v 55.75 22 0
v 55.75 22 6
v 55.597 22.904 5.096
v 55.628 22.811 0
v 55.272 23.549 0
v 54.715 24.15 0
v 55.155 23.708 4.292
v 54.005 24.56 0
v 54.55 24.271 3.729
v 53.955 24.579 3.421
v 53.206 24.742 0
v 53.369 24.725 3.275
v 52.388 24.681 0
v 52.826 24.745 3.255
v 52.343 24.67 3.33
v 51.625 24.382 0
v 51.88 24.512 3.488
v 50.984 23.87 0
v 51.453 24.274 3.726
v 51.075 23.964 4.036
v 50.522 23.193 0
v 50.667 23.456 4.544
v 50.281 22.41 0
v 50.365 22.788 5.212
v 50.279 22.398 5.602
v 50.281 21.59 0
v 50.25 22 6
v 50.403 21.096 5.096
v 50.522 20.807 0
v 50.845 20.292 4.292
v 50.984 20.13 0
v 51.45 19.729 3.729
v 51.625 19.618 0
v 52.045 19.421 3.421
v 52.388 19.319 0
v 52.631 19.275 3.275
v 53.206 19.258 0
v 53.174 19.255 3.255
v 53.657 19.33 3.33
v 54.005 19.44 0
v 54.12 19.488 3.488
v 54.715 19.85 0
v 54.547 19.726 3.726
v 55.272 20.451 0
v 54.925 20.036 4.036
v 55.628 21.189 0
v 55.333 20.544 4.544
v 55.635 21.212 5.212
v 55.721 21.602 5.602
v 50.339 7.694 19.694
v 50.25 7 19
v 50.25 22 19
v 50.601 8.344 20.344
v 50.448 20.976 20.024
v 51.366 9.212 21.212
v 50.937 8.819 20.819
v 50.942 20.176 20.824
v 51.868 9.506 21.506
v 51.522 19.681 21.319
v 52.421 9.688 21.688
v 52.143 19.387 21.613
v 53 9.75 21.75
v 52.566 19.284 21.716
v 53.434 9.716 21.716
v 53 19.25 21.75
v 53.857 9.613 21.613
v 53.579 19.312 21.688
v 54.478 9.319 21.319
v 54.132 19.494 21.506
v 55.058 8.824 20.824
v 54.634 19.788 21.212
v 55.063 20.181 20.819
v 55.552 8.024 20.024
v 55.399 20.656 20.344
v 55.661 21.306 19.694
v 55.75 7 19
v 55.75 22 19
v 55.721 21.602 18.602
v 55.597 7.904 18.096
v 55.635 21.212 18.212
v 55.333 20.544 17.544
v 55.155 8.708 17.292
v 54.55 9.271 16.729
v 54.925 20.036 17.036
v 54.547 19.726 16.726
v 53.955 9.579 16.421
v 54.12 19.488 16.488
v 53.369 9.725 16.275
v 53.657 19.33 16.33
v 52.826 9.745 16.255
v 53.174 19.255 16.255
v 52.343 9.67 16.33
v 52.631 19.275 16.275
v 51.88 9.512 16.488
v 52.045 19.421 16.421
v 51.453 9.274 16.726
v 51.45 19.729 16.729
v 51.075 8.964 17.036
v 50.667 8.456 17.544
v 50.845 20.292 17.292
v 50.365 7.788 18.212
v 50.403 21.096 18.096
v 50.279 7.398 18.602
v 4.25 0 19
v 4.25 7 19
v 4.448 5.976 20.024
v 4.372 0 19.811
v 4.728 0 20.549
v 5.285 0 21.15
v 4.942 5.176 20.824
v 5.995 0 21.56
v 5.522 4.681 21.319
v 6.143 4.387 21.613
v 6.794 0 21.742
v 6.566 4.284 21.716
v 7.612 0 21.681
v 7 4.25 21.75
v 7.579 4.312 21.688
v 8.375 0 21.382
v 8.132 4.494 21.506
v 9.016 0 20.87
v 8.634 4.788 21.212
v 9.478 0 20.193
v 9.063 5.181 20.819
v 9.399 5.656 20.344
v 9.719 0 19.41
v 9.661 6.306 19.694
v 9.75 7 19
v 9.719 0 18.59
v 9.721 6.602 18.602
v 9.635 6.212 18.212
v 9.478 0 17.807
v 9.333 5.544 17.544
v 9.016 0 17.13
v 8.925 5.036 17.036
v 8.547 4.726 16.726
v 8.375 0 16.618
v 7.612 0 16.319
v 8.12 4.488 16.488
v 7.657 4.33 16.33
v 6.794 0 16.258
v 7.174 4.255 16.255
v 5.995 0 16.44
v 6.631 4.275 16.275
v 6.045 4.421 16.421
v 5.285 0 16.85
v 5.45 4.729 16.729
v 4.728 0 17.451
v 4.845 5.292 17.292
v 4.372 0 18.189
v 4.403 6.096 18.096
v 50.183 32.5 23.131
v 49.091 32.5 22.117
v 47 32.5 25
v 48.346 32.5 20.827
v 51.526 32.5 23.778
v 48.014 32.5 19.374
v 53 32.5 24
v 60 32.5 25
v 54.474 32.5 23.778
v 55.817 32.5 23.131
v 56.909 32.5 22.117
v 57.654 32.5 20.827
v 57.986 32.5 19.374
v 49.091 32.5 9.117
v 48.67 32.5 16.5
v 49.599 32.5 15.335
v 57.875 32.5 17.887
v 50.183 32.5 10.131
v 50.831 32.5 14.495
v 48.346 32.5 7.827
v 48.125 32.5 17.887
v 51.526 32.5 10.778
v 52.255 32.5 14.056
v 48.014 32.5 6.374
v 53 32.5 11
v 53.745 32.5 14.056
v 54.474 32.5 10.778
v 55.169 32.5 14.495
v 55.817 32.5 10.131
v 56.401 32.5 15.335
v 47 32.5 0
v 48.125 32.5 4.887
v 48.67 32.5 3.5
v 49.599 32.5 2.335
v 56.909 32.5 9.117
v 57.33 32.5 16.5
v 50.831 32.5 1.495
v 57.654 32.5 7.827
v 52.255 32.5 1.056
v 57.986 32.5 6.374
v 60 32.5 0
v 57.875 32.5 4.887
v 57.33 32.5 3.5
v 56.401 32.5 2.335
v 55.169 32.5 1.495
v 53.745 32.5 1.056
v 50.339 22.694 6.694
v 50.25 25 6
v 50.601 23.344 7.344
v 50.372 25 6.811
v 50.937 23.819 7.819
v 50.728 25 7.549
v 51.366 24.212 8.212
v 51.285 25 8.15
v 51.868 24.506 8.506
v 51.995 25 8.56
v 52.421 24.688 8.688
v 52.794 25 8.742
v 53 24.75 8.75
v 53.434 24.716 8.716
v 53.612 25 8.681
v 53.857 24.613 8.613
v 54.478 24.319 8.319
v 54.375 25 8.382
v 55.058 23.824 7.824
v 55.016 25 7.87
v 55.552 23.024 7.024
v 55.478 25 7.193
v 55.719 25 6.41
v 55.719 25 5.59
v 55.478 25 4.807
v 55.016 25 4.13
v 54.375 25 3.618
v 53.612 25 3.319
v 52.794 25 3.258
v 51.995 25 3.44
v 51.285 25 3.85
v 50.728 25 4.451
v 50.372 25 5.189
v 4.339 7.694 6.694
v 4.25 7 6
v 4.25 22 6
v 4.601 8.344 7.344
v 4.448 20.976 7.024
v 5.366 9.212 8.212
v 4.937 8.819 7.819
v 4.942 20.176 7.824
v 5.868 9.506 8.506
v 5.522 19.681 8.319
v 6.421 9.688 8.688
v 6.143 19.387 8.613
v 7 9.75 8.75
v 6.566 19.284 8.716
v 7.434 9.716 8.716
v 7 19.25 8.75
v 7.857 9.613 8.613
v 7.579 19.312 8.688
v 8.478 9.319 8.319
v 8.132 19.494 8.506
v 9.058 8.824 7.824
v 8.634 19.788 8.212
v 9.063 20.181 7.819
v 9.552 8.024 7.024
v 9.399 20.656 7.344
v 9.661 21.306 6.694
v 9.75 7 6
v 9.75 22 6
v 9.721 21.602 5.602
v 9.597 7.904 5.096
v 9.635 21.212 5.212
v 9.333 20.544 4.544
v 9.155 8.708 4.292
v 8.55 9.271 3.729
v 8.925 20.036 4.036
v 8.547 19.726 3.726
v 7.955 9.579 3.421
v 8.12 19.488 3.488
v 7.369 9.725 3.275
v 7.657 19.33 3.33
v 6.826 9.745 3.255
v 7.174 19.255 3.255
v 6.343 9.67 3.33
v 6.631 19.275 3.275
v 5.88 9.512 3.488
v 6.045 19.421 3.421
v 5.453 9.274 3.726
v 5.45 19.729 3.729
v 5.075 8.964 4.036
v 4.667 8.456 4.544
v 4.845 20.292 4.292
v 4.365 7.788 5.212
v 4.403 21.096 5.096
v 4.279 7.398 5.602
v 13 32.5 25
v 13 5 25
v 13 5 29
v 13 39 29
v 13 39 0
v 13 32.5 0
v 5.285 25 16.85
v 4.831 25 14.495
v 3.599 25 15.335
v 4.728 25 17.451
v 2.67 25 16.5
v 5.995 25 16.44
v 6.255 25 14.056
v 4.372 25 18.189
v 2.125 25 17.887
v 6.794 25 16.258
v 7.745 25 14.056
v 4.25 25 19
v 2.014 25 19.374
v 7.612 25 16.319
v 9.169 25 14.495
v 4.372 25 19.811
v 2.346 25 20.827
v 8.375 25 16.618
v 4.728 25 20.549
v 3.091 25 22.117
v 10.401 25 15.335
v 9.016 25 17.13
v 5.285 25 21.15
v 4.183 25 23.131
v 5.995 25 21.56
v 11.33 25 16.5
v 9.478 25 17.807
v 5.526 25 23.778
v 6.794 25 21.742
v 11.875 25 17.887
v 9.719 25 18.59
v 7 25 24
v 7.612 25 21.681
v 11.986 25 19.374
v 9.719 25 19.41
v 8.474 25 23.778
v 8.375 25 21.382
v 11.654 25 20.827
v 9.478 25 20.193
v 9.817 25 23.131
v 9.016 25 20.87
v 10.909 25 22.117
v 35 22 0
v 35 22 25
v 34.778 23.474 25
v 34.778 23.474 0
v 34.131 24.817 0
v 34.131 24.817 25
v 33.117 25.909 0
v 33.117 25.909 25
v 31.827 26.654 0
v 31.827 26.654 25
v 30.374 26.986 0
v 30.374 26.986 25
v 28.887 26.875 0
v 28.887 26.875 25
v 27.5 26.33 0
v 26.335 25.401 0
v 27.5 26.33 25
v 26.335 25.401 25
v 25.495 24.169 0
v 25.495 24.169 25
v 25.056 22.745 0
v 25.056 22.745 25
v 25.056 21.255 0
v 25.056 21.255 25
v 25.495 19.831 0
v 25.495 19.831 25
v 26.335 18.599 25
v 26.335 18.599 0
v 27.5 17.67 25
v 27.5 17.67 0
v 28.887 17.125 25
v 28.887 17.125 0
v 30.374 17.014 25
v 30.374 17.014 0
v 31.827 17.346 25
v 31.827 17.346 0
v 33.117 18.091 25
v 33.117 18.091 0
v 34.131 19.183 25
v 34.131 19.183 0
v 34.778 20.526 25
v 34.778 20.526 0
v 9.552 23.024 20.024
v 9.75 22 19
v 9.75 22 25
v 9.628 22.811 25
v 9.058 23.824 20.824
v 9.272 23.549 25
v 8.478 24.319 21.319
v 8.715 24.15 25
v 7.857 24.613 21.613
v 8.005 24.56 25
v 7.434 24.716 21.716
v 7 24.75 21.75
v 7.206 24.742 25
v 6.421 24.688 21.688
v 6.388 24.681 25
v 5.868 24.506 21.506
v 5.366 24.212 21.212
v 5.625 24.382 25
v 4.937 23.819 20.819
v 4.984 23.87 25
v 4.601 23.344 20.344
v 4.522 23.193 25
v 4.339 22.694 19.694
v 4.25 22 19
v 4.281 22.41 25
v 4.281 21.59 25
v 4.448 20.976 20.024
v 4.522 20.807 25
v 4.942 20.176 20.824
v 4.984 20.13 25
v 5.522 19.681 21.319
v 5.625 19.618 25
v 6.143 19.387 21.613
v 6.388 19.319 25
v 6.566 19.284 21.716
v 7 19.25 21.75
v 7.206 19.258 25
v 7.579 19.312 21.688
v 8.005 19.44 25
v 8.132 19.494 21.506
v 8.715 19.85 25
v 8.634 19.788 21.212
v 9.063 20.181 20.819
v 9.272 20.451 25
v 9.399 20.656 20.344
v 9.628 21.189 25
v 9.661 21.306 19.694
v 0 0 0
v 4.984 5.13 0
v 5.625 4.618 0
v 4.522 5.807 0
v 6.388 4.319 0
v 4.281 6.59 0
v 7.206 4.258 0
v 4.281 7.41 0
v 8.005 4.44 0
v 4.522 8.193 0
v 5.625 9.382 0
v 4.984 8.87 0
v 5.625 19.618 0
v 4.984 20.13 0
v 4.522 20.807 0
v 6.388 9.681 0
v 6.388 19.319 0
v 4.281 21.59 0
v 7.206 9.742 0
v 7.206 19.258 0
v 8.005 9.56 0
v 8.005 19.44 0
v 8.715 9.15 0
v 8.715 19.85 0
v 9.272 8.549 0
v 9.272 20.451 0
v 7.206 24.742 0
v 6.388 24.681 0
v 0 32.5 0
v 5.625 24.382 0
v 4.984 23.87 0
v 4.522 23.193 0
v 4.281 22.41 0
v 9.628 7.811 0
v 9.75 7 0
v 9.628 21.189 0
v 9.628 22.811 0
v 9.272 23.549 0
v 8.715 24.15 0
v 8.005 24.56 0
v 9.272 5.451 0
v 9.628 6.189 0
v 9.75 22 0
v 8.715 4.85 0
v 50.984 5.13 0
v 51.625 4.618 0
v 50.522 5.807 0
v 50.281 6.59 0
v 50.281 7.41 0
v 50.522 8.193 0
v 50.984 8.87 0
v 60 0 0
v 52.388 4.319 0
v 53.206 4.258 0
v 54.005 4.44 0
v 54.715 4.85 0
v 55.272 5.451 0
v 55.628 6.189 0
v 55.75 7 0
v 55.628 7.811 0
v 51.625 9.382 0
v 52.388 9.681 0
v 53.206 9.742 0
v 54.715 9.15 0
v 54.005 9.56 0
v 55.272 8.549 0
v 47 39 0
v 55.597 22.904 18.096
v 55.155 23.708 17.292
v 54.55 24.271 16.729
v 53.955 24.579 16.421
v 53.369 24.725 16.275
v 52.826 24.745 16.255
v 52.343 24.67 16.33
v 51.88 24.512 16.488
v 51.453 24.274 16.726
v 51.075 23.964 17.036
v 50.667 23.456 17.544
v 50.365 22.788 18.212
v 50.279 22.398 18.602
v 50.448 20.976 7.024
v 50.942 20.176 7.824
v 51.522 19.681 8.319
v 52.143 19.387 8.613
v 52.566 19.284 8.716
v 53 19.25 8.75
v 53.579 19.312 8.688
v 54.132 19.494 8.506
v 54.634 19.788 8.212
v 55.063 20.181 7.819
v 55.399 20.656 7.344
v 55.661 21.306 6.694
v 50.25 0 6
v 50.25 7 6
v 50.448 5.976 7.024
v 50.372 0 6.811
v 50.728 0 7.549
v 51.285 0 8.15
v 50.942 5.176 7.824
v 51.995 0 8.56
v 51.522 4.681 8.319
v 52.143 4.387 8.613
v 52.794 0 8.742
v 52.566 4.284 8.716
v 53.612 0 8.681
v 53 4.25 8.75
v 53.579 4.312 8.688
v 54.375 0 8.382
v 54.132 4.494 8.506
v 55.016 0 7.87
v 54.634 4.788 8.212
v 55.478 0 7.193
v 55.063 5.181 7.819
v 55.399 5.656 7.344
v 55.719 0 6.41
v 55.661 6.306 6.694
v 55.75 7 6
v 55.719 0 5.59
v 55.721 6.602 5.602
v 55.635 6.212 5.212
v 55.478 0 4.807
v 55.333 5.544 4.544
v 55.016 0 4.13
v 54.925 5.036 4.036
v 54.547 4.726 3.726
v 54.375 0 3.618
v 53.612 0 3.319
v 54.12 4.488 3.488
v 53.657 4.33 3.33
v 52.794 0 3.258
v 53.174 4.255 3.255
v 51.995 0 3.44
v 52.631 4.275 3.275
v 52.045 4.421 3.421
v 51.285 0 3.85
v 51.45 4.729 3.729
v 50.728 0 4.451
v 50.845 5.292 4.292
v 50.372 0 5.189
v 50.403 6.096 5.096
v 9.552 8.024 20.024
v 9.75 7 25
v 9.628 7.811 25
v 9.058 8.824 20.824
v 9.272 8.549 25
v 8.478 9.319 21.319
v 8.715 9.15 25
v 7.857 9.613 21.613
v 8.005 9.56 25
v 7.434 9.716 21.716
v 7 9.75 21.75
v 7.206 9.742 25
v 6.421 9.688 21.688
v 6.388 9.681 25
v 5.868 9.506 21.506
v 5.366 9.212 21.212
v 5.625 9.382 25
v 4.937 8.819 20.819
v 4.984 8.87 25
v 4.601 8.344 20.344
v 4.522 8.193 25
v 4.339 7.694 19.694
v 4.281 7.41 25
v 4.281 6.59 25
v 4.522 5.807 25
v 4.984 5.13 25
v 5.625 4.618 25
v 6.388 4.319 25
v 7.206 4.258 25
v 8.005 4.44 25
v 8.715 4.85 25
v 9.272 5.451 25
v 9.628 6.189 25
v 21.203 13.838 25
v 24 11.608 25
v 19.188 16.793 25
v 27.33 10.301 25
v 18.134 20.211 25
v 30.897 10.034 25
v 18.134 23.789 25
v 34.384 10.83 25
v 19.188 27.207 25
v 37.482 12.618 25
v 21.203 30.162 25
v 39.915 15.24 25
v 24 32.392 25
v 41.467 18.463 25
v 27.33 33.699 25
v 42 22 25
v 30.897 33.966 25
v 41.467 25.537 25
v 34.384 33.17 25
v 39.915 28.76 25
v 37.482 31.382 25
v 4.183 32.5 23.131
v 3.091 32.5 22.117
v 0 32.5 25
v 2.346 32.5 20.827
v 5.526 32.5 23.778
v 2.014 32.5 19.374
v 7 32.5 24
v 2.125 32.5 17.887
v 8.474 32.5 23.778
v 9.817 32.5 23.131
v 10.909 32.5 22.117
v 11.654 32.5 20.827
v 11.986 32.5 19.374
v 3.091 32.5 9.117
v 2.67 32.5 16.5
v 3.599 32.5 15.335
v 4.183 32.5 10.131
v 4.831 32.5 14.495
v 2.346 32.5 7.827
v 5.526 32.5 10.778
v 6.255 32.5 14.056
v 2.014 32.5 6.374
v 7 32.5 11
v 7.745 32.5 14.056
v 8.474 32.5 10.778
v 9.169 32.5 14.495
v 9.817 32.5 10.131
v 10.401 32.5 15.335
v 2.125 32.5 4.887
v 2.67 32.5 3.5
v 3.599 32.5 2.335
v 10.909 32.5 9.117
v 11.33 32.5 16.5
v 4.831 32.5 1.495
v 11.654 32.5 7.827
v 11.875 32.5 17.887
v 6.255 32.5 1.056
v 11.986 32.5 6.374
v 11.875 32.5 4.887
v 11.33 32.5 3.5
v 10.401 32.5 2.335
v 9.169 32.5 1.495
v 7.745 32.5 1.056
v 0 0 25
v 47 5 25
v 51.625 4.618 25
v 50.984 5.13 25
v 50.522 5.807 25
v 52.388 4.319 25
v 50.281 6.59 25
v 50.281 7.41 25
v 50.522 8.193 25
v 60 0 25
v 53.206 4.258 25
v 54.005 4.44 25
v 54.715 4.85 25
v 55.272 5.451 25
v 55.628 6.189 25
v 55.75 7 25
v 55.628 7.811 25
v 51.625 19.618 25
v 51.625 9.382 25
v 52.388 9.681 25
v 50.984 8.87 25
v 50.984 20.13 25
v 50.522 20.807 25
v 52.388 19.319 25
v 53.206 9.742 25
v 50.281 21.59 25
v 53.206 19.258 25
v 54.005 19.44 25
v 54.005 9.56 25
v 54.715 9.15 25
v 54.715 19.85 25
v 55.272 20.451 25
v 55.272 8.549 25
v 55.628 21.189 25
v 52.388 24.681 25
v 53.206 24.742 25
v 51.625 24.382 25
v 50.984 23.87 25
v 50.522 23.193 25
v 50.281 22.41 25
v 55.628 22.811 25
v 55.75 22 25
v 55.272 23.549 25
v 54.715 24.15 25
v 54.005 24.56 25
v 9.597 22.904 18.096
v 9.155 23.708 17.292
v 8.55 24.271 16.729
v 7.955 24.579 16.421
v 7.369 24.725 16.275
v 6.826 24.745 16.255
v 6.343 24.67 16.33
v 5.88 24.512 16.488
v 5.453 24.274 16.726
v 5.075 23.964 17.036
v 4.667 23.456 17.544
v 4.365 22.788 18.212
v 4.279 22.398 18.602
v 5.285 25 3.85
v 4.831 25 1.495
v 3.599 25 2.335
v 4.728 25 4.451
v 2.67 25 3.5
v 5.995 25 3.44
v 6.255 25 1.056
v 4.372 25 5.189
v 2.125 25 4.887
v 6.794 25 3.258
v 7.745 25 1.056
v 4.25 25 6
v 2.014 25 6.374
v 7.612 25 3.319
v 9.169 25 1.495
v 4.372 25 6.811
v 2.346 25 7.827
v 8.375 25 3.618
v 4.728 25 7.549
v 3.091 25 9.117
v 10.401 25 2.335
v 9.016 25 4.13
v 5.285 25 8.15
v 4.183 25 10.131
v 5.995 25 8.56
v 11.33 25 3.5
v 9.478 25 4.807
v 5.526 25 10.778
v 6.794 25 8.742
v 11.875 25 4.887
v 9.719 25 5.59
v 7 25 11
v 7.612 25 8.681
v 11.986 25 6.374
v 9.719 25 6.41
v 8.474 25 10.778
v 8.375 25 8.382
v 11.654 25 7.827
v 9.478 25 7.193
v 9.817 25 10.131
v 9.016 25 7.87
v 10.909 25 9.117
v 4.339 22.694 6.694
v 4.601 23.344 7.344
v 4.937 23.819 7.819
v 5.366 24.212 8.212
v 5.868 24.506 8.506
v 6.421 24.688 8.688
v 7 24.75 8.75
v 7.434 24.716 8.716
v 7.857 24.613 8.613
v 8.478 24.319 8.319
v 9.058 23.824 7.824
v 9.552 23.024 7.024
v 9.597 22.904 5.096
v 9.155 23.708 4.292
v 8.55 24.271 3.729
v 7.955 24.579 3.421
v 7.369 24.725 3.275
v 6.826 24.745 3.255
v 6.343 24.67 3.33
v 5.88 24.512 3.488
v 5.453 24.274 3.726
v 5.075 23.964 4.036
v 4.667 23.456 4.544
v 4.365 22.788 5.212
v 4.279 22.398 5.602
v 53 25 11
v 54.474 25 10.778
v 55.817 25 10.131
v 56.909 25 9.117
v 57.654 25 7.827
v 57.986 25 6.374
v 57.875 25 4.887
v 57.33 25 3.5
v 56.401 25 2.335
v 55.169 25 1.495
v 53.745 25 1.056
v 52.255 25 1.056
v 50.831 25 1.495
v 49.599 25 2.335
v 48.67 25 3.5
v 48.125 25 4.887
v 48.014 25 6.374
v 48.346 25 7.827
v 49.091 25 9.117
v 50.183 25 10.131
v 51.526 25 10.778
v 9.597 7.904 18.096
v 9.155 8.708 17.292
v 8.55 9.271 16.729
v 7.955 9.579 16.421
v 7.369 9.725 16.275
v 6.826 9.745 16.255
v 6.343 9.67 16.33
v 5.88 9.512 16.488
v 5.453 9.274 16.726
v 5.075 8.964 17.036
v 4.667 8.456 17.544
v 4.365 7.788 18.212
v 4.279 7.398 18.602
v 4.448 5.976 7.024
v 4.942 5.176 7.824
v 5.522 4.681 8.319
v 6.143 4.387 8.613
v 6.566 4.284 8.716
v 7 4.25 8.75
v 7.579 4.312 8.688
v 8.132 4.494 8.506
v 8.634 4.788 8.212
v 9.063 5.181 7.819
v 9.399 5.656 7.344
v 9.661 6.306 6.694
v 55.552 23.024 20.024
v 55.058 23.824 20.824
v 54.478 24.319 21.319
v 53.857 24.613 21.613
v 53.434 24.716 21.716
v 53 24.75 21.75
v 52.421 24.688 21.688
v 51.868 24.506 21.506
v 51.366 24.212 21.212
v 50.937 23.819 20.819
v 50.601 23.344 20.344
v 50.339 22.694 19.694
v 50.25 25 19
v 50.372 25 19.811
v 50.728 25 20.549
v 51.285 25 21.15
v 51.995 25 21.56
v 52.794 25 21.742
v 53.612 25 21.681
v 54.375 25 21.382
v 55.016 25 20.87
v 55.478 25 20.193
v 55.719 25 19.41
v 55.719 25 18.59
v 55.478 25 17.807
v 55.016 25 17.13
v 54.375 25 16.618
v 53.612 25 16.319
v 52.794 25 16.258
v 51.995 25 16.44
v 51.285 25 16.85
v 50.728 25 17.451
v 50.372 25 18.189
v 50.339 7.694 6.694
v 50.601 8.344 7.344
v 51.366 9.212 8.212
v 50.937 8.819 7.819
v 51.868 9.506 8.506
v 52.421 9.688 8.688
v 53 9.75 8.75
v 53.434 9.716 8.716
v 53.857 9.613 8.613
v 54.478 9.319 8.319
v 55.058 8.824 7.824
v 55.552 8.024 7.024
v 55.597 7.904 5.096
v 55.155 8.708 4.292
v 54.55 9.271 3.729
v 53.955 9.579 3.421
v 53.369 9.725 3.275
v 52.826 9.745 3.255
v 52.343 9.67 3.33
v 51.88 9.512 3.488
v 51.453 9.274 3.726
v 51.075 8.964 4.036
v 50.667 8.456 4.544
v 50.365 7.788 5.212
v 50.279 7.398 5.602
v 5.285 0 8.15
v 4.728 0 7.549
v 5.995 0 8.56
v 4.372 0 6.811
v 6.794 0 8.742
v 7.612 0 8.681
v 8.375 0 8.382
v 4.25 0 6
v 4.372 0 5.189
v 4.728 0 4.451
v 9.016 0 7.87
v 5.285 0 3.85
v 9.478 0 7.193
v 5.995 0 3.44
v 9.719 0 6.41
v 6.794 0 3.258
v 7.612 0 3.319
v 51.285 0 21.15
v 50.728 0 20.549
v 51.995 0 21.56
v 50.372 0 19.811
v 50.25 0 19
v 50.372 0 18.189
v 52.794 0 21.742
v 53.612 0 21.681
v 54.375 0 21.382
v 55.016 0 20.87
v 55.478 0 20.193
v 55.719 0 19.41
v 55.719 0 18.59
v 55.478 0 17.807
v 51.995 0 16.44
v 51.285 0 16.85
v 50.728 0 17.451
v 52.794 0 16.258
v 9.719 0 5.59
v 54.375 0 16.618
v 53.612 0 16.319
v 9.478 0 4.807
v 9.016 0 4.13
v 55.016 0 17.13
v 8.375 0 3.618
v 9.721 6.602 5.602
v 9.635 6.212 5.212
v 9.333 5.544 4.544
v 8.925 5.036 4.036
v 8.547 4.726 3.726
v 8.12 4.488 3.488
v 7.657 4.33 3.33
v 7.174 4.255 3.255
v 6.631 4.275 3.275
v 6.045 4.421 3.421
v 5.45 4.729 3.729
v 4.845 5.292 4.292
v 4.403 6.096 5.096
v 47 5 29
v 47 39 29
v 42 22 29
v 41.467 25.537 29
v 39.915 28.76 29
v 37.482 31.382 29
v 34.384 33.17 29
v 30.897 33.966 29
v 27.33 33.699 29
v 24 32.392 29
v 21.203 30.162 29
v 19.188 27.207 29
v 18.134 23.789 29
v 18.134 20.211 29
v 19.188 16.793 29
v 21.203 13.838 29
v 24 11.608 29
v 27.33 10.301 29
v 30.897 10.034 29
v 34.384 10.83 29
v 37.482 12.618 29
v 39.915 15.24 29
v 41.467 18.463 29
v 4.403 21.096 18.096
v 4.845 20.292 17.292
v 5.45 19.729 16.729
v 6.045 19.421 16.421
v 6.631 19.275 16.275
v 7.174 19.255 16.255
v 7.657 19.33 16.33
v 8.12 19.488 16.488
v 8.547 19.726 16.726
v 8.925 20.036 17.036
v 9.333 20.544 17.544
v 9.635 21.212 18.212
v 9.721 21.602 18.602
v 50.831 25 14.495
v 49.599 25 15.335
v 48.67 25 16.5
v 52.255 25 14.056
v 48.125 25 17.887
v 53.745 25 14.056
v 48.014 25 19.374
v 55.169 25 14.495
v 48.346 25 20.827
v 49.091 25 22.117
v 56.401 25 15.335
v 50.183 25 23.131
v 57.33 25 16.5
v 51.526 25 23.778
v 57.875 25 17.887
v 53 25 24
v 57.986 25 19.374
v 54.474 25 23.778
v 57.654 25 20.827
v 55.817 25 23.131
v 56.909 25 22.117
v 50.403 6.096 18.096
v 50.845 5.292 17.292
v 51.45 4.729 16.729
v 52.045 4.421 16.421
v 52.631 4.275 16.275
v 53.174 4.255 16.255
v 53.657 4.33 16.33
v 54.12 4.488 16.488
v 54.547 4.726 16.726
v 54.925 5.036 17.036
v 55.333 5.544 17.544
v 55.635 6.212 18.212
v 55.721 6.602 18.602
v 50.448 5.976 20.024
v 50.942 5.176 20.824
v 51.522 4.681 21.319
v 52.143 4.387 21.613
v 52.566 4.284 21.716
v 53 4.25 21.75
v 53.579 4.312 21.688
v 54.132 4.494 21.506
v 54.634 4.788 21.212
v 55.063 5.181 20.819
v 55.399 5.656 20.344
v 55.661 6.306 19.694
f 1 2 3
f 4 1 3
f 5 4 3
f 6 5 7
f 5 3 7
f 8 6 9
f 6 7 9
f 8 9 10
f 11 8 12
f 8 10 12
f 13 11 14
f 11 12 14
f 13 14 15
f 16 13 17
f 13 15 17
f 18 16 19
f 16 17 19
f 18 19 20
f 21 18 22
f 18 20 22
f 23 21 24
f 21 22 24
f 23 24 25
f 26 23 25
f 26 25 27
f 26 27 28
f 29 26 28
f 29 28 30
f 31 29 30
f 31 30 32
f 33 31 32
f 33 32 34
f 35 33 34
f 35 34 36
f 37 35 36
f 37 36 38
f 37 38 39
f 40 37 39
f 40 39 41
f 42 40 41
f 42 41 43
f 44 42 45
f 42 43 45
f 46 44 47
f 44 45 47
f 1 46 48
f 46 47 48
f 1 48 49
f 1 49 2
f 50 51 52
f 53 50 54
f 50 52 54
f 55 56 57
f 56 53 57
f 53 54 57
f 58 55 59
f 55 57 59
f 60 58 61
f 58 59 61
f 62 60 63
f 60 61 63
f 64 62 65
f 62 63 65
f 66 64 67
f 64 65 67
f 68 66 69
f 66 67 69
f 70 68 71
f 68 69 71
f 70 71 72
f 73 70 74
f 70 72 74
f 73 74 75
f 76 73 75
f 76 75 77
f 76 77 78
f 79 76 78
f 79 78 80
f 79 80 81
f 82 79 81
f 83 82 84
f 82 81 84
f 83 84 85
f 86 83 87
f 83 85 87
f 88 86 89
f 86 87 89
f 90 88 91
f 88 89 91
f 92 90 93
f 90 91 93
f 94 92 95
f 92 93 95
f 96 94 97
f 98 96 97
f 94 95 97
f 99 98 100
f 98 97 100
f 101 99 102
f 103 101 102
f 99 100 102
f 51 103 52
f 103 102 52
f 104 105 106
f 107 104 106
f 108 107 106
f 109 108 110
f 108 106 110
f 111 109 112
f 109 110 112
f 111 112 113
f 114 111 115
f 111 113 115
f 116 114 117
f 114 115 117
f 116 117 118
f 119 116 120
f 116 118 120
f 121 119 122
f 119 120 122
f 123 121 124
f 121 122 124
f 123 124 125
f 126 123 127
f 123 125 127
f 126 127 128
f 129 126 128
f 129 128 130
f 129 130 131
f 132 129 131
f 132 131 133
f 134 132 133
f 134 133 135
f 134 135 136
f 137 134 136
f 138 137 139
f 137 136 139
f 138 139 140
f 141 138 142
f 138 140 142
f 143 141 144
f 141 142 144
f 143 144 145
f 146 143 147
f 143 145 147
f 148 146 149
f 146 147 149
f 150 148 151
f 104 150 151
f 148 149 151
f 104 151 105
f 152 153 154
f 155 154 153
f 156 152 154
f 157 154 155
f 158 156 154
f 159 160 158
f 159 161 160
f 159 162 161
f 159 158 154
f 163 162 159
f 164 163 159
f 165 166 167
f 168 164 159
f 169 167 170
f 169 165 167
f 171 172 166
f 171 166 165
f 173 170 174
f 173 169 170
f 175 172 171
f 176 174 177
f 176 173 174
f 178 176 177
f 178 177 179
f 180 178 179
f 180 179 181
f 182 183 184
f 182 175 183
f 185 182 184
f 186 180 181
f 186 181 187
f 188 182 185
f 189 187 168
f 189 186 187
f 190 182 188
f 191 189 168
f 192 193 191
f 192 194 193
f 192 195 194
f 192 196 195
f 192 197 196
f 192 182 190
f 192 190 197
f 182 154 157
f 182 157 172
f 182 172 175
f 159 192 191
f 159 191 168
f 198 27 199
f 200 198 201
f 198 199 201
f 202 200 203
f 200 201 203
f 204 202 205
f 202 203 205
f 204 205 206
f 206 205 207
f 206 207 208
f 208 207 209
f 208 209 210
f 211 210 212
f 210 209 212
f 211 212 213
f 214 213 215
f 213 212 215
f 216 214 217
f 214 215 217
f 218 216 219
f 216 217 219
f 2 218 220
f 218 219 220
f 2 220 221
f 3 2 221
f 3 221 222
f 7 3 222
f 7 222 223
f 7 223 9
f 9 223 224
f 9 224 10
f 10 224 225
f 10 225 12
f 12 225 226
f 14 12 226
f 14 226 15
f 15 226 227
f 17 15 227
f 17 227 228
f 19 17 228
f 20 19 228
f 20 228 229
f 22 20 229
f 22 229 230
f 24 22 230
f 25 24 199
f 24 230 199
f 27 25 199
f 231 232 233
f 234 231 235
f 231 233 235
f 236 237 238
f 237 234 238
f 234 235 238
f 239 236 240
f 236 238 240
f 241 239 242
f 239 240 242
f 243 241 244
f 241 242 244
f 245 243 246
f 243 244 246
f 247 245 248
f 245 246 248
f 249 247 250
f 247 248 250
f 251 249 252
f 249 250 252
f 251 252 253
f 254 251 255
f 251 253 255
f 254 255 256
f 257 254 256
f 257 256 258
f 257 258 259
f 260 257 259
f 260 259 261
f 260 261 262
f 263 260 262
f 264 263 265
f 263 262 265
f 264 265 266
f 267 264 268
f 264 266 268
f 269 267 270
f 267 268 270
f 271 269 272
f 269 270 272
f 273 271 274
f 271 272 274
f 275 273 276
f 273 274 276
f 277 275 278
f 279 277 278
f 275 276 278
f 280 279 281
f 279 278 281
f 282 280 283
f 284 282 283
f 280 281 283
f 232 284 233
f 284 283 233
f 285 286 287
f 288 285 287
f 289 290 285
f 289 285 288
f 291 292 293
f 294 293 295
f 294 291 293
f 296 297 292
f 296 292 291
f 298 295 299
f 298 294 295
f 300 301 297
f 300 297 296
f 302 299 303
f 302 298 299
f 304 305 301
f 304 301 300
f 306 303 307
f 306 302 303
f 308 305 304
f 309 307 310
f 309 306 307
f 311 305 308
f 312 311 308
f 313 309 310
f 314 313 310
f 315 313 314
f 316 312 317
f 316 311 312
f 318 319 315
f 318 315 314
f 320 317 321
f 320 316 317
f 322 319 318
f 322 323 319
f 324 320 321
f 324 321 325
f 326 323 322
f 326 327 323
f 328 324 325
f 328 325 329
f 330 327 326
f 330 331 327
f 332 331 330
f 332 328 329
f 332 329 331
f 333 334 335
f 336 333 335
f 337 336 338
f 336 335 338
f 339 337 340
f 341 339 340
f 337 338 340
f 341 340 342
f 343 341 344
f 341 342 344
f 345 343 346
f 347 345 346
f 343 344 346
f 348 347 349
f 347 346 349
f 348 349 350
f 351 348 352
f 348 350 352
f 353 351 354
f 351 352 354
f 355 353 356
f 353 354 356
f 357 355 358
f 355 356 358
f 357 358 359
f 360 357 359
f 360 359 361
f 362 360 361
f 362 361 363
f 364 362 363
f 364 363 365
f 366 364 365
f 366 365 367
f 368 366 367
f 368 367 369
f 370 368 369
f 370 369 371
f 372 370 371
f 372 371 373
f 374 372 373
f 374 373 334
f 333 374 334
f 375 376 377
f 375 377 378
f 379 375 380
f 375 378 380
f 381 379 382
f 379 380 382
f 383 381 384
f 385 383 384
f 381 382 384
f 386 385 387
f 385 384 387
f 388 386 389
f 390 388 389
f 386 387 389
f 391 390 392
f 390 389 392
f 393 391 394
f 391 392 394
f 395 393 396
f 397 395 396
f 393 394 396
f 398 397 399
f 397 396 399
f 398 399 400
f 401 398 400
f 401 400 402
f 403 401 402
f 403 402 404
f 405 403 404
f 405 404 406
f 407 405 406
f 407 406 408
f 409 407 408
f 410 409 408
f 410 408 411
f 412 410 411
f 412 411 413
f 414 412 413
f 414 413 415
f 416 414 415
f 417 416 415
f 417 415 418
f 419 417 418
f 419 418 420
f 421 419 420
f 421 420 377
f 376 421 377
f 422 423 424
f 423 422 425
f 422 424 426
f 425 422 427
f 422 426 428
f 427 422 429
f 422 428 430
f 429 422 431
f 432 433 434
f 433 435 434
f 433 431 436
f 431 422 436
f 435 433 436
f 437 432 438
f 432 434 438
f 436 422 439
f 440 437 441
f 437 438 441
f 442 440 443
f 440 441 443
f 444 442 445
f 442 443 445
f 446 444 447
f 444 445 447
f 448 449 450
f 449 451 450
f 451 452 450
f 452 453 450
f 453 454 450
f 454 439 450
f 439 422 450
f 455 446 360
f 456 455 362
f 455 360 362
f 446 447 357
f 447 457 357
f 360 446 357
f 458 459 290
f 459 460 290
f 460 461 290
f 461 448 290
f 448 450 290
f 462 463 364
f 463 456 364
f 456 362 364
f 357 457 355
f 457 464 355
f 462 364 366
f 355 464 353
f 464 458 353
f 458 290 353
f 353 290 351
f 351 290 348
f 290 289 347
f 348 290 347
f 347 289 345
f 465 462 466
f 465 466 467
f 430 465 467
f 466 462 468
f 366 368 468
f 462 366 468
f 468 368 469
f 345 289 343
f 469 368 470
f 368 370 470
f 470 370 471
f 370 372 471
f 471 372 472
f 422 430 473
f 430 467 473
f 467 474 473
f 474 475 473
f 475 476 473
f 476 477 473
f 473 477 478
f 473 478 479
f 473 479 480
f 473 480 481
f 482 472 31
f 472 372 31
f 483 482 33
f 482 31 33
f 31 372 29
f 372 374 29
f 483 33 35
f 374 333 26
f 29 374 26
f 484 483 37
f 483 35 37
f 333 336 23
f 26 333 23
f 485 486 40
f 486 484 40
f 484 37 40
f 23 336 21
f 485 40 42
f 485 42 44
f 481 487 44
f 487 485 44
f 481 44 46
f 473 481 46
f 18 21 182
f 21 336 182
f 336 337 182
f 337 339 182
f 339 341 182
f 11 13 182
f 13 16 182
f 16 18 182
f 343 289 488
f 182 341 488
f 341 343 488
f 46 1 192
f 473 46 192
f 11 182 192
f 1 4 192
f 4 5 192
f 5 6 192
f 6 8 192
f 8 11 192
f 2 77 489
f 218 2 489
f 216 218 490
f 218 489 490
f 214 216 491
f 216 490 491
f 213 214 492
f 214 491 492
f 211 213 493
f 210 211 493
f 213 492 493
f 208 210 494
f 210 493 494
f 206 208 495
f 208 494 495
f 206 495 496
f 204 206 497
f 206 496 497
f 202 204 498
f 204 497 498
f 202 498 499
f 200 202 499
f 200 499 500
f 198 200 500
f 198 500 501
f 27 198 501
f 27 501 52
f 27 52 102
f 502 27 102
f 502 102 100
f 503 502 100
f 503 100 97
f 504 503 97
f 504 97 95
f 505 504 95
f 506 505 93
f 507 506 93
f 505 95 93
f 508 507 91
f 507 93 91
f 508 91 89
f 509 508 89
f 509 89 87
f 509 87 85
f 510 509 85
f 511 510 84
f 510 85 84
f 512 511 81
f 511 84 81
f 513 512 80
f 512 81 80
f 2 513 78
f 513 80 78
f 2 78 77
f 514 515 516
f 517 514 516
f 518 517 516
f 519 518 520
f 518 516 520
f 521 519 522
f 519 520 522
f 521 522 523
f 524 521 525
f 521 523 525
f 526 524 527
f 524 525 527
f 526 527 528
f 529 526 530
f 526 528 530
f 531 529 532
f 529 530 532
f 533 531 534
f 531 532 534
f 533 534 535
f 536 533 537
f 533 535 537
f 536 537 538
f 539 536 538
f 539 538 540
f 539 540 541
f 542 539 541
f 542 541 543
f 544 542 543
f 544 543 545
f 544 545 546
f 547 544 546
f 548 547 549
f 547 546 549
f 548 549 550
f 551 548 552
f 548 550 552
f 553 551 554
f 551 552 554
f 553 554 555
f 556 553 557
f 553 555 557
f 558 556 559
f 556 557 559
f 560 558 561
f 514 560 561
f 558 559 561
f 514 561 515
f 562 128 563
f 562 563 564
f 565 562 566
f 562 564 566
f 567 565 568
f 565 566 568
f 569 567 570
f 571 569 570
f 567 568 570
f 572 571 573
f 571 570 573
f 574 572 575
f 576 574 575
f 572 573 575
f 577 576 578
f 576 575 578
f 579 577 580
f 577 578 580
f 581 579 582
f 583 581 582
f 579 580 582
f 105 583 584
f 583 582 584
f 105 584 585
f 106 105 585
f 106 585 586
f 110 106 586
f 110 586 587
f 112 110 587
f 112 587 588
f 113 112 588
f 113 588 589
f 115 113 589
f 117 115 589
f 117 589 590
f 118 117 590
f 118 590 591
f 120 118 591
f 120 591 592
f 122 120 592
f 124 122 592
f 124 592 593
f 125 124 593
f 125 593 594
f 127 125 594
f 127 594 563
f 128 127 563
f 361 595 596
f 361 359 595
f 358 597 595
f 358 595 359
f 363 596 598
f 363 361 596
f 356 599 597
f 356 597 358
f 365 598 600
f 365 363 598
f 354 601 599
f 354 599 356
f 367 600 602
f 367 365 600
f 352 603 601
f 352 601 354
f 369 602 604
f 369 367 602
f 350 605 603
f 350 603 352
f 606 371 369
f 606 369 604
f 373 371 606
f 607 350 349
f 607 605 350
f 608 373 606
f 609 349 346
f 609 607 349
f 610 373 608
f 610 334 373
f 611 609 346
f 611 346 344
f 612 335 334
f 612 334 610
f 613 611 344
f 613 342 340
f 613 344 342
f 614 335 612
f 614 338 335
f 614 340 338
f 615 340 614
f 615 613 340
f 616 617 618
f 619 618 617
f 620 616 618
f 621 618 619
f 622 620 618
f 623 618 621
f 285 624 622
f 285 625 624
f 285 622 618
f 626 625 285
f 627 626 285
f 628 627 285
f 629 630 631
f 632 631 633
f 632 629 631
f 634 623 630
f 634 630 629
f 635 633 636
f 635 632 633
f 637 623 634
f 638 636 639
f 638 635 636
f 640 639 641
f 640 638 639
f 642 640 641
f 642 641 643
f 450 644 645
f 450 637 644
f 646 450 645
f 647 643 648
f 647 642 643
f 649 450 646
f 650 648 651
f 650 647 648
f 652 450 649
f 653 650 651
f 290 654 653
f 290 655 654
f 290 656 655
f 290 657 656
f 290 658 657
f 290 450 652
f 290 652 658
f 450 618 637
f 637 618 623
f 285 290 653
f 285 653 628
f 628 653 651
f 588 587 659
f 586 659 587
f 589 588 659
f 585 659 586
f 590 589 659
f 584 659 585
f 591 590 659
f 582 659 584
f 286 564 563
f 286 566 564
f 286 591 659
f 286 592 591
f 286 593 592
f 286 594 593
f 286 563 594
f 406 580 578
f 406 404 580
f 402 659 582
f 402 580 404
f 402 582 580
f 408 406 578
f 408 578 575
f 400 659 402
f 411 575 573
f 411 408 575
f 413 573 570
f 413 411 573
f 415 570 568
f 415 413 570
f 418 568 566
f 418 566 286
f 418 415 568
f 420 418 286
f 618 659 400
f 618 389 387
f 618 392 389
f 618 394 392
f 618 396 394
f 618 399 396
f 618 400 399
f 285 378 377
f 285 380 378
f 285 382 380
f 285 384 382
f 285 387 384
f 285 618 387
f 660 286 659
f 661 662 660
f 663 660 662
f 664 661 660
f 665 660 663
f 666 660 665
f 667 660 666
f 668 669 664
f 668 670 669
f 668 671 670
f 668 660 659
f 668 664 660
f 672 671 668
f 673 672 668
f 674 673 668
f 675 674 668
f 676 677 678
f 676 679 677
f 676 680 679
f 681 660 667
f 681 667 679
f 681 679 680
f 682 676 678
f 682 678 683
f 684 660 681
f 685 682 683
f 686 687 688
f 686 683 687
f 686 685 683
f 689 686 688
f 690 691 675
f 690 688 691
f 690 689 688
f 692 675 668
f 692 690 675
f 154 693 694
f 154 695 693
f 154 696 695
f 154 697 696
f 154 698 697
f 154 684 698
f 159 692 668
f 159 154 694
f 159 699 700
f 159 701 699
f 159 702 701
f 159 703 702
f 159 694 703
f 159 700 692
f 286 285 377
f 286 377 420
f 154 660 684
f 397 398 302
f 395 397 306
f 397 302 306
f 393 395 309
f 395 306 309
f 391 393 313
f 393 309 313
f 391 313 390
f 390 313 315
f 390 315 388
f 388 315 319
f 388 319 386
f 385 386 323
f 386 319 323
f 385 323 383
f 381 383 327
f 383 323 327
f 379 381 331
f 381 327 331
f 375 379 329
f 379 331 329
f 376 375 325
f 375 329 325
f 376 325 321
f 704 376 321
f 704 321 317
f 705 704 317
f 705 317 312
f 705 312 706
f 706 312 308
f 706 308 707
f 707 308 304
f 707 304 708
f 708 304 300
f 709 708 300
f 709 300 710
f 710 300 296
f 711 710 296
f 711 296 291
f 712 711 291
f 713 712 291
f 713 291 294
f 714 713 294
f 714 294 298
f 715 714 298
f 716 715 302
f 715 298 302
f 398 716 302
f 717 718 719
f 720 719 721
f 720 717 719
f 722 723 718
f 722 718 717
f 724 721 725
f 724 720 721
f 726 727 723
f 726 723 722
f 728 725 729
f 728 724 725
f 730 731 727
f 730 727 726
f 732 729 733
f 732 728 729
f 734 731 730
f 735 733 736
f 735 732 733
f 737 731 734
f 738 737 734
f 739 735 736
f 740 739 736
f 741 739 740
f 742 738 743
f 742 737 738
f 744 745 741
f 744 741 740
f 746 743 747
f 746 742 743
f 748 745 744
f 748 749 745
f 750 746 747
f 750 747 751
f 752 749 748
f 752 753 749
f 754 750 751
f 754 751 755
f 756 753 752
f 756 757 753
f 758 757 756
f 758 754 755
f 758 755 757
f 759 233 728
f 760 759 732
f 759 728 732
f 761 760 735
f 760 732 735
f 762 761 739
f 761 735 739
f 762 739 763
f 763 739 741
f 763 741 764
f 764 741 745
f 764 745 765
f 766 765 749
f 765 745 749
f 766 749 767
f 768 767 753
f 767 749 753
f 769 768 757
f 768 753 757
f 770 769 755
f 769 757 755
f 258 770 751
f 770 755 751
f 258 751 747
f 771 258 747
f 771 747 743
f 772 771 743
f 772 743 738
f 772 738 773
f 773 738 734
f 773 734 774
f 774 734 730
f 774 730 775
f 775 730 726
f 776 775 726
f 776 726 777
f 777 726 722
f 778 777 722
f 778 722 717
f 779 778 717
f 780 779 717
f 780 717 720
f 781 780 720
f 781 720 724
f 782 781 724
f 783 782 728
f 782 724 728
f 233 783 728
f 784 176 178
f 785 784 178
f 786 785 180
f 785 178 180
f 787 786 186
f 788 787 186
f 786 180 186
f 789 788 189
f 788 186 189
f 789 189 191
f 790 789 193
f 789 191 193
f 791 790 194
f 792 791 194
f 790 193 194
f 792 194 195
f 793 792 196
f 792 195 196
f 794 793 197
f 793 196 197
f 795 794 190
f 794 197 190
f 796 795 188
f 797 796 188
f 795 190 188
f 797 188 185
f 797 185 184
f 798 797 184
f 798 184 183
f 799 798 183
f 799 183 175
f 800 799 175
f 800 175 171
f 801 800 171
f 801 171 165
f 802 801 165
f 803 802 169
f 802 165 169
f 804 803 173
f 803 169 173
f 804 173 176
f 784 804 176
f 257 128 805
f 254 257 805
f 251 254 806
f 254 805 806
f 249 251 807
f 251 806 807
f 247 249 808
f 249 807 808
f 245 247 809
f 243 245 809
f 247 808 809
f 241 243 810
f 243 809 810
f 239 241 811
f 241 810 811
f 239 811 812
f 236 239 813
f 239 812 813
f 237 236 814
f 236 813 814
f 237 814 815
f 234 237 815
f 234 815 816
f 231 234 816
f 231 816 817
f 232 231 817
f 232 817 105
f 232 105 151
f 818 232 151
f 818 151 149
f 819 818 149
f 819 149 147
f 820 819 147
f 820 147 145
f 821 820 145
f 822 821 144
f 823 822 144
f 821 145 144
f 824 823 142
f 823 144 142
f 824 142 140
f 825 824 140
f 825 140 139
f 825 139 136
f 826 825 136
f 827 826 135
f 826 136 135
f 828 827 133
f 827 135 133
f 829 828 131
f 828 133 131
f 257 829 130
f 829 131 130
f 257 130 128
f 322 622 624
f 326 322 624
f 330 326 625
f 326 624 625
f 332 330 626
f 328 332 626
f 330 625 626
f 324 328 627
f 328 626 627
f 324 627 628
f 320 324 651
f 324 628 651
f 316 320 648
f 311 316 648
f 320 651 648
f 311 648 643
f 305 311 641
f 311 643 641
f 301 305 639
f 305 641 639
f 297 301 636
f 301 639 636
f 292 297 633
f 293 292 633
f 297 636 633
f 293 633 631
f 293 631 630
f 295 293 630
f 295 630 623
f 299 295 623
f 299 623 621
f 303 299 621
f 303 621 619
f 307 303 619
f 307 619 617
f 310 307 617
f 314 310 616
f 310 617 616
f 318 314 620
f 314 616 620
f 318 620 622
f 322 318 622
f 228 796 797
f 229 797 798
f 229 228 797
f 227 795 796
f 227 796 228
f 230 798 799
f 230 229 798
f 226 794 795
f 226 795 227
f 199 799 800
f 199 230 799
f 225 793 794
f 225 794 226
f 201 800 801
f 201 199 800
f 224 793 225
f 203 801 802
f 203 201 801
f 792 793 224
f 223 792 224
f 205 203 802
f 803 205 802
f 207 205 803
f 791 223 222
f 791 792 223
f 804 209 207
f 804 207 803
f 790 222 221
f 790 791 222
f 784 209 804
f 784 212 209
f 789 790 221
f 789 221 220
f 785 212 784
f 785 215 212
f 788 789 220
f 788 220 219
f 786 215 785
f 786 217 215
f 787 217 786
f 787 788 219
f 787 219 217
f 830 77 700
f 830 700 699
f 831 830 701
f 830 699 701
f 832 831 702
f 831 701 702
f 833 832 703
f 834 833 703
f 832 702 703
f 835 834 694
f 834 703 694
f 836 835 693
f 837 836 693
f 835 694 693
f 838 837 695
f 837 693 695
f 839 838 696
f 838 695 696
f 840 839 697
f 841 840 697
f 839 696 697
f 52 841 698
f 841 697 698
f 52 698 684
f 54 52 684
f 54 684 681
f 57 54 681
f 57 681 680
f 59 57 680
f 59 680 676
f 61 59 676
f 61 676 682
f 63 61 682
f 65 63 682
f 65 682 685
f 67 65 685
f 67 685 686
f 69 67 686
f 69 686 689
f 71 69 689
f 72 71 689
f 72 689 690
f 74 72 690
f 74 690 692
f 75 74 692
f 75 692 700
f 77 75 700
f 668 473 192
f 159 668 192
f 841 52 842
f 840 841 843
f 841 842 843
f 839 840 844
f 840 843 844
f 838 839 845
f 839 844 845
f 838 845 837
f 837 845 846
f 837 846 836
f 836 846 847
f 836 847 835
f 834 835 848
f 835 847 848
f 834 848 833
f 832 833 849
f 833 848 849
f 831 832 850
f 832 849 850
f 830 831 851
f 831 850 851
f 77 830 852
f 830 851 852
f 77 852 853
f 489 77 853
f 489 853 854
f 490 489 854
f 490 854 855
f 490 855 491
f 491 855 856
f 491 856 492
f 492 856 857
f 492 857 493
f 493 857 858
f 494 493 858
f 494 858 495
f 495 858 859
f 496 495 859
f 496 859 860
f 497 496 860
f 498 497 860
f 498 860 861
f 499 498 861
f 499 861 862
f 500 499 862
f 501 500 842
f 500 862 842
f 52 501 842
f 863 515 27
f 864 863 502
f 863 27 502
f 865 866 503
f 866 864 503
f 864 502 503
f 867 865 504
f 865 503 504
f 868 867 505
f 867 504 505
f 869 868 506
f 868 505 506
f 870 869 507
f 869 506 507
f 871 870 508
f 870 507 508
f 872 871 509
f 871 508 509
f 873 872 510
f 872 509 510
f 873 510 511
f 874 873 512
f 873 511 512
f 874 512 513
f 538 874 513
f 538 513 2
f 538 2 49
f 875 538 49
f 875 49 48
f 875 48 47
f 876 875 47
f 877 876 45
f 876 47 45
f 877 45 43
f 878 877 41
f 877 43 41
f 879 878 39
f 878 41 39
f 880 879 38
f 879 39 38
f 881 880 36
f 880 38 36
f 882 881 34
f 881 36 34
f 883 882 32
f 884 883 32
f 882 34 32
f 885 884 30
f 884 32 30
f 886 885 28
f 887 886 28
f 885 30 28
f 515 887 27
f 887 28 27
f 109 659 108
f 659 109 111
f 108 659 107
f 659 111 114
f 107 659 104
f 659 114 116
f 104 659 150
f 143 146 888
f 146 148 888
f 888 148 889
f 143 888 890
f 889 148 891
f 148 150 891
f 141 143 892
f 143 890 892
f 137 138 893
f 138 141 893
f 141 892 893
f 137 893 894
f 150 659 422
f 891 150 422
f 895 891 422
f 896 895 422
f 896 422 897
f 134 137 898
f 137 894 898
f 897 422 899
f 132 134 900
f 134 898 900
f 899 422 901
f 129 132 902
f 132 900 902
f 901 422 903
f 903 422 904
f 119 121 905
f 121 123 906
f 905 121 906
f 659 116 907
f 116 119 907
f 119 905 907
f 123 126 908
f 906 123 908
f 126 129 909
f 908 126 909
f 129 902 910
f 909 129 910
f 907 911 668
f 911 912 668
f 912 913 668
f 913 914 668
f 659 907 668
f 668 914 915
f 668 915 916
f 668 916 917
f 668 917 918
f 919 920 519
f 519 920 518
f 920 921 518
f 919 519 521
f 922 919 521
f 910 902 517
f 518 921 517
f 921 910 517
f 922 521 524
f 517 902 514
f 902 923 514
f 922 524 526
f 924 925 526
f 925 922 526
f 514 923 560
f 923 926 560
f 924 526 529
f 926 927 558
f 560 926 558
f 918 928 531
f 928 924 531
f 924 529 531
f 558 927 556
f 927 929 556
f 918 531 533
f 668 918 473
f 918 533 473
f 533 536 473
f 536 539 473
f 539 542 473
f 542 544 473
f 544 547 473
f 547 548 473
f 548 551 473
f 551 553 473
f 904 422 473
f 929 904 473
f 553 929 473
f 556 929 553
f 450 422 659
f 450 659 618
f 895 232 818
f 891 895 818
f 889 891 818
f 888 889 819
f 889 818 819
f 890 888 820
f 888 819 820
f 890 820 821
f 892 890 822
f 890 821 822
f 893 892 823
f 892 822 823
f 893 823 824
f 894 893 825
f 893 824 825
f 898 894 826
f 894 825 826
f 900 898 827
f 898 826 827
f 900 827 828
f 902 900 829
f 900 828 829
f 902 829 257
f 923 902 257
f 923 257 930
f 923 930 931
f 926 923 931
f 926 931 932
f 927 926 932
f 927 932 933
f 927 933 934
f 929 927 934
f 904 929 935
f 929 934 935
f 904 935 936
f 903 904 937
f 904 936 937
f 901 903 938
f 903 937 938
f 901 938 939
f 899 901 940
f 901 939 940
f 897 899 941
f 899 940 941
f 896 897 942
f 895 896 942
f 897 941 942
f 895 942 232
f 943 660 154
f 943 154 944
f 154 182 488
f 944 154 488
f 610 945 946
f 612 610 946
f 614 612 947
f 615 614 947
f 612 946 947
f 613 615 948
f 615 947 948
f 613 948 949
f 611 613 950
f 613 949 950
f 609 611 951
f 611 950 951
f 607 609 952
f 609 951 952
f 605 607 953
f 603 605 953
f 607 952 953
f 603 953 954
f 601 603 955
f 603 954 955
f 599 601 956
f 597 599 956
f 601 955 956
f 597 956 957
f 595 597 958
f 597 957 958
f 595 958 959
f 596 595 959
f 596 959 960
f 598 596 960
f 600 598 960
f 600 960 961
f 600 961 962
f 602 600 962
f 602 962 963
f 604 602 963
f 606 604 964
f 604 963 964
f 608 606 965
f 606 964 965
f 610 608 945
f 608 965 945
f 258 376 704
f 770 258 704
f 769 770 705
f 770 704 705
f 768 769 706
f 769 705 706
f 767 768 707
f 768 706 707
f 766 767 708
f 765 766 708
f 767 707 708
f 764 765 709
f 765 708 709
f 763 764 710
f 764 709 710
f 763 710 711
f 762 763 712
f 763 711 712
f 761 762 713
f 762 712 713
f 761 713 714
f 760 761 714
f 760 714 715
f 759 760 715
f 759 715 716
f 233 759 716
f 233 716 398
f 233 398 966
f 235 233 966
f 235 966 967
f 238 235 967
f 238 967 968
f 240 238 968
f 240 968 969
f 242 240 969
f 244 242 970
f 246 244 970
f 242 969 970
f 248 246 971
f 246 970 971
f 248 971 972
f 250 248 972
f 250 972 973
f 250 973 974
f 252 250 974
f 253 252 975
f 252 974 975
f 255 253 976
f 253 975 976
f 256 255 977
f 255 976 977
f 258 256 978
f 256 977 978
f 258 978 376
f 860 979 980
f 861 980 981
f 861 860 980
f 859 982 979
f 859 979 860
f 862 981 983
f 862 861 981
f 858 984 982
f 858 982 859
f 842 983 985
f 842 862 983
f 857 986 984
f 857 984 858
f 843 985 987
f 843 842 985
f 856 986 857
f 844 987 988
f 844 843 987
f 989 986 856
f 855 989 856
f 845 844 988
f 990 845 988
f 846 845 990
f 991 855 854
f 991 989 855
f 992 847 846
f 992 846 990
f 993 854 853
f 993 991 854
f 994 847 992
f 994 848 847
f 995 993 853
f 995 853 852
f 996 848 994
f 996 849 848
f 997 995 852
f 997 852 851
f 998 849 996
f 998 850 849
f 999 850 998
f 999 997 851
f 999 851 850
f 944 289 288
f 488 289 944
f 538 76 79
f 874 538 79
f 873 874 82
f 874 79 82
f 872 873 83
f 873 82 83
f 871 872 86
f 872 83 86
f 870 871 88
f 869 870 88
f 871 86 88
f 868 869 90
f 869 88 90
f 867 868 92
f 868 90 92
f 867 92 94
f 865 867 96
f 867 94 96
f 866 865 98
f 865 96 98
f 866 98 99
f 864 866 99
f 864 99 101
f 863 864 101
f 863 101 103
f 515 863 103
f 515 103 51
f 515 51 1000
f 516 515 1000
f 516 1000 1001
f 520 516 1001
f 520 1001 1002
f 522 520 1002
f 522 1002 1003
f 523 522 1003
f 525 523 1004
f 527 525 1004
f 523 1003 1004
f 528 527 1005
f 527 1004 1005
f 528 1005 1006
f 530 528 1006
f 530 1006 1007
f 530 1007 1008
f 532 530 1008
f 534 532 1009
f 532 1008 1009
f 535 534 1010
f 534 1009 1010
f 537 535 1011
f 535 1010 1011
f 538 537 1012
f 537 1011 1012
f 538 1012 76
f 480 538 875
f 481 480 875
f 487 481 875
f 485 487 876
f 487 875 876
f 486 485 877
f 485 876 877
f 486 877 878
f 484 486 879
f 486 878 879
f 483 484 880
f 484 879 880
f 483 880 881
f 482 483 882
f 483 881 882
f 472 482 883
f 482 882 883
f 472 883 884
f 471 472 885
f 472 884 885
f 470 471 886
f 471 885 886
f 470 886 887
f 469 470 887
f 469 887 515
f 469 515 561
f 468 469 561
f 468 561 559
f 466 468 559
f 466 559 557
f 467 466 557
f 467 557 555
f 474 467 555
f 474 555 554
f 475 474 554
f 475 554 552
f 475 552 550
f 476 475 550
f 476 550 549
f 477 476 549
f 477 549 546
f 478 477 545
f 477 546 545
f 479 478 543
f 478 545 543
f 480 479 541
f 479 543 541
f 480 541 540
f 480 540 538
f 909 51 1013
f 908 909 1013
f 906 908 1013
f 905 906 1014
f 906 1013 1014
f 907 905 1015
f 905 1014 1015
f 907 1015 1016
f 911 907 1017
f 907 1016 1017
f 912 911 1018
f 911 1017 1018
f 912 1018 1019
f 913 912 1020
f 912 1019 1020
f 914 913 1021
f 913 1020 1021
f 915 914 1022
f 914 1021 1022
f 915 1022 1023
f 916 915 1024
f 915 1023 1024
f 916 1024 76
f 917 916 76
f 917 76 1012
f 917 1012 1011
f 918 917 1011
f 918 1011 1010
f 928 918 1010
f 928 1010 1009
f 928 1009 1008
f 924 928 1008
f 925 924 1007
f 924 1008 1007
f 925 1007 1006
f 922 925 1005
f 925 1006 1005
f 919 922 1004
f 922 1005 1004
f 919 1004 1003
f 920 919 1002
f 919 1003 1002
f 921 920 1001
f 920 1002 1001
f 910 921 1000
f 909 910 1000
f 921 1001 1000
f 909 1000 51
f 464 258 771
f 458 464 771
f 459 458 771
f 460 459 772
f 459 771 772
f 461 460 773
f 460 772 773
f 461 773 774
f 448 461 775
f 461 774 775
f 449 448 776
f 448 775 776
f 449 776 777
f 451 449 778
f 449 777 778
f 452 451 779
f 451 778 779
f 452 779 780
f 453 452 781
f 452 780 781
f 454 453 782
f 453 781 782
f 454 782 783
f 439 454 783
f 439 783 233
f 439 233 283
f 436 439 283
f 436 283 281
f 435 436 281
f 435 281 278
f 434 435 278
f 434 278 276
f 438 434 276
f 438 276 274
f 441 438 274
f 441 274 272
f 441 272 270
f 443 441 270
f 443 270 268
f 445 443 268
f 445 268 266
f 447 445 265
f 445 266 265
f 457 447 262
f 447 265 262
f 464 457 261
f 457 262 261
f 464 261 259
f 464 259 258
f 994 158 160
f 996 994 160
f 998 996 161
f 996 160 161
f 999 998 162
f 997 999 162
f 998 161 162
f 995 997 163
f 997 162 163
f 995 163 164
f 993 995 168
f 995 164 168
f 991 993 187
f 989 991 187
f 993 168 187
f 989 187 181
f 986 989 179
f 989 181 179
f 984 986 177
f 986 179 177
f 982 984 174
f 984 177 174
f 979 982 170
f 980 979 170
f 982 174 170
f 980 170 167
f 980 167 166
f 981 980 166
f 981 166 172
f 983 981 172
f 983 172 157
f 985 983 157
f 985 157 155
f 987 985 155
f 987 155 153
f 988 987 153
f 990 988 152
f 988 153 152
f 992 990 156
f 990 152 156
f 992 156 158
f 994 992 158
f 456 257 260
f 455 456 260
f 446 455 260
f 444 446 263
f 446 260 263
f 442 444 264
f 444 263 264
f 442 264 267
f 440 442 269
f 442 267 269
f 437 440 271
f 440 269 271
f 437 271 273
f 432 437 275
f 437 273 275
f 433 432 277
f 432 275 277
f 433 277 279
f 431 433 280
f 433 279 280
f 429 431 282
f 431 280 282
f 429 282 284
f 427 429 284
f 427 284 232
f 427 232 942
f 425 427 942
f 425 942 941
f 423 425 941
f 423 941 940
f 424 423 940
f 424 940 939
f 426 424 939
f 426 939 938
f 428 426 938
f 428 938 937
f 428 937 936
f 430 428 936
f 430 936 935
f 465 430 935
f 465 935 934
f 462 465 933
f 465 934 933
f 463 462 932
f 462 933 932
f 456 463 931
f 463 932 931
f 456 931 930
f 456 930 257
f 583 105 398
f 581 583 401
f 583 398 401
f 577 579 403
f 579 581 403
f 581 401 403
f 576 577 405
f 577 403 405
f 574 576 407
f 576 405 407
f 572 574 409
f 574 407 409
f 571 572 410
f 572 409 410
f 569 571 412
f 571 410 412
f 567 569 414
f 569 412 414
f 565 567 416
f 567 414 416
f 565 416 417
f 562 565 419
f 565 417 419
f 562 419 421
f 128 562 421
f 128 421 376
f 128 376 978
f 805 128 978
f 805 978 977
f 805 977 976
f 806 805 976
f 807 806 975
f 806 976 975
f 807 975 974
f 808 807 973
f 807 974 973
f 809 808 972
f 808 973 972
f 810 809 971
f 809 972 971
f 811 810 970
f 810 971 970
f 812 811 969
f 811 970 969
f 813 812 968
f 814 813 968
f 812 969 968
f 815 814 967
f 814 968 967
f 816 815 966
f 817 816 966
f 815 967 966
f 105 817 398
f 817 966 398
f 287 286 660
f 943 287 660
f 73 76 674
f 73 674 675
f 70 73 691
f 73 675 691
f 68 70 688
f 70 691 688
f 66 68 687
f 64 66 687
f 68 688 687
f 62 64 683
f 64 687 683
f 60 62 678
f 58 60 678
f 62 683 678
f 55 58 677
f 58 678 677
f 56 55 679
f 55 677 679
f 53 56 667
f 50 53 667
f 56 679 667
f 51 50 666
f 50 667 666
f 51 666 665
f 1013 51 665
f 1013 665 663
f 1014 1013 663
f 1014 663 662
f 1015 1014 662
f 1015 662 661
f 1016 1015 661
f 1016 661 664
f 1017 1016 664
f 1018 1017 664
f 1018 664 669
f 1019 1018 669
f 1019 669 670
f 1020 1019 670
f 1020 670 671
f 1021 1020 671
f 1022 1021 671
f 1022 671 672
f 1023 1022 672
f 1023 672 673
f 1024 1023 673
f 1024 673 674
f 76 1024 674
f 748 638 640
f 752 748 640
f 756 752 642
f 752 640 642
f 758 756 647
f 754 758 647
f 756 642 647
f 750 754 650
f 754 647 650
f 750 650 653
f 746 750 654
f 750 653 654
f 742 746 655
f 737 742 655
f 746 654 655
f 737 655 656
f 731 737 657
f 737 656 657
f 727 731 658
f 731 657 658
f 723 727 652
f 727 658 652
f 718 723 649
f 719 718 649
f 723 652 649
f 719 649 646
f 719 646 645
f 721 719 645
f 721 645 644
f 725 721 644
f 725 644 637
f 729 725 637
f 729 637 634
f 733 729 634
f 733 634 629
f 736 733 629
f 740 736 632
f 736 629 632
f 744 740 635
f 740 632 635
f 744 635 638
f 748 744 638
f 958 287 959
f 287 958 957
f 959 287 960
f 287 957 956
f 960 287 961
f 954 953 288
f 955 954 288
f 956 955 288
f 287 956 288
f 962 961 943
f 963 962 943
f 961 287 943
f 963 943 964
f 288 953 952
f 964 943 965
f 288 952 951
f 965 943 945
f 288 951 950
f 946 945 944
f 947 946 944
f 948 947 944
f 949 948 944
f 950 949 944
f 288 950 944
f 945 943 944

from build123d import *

# Parameters (mm, degrees)
SKETCH_1_W          = 60
SKETCH_1_H          = 32.5
EXTRUDE_1_DEPTH     = 25
SKETCH_2_W          = 34
SKETCH_2_H          = 34
EXTRUDE_2_DEPTH     = 25
SKETCH_2_2_W        = 34
SKETCH_2_2_H        = 34
EXTRUDE_3_DEPTH     = 42
SKETCH_3_W          = 38
SKETCH_3_H          = 34
CUT_EXTRUDE_1_DEPTH = 91.65870063
SKETCH_4_R          = 2.75
CUT_EXTRUDE_2_DEPTH = 76.802374633
SKETCH_5_R          = 2.75
CUT_EXTRUDE_3_DEPTH = 75.143442057
SKETCH_6_R          = 5
CUT_EXTRUDE_4_DEPTH = 7.5
SKETCH_7_R          = 5
CUT_EXTRUDE_5_DEPTH = 78.21398837
SKETCH_8_R          = 12
CUT_EXTRUDE_6_DEPTH = 4


with BuildPart() as part:
    # Эскиз1 → Бобышка-Вытянуть1 (new body)
    with BuildSketch(Plane.XY):
        with Locations((30, 16.25)):
            Rectangle(SKETCH_1_W, SKETCH_1_H)
    extrude(amount=EXTRUDE_1_DEPTH)

    # Эскиз2 → Бобышка-Вытянуть2 (add)
    with BuildSketch(Plane.XY.offset(25)):
        with Locations((30, 22)):
            Rectangle(SKETCH_2_W, SKETCH_2_H)
    extrude(amount=-EXTRUDE_2_DEPTH)

    # Эскиз2<2> → Бобышка-Вытянуть3 (add)
    with BuildSketch(Plane.XY.offset(25)):
        with Locations((30, 22)):
            Rectangle(SKETCH_2_2_W, SKETCH_2_2_H)
    extrude(amount=EXTRUDE_3_DEPTH)

    # Эскиз3 → Вырез-Вытянуть1 (cut, through all)
    with BuildSketch(Plane(origin=(47, 0, 0), x_dir=(0, 0, -1), z_dir=(1, 0, 0))):
        with Locations((-48, 22)):
            Rectangle(SKETCH_3_W, SKETCH_3_H)
    extrude(amount=-CUT_EXTRUDE_1_DEPTH, mode=Mode.SUBTRACT)

    # Эскиз4 → Вырез-Вытянуть2 (cut, through all)
    with BuildSketch(Plane.XY.offset(25)):
        with Locations((7, 22)):
            Circle(SKETCH_4_R)
        with Locations((7, 7)):
            Circle(SKETCH_4_R)
        with Locations((53, 7)):
            Circle(SKETCH_4_R)
        with Locations((53, 22)):
            Circle(SKETCH_4_R)
    extrude(amount=-CUT_EXTRUDE_2_DEPTH, mode=Mode.SUBTRACT)

    # Эскиз5 → Вырез-Вытянуть3 (cut, through all)
    with BuildSketch(Plane(origin=(0, 32.5, 0), x_dir=(1, 0, 0), z_dir=(0, 1, 0))):
        with Locations(Location((7, -19, 0), (0, 0, 180))):
            Circle(SKETCH_5_R)
        with Locations(Location((7, -6, 0), (0, 0, 180))):
            Circle(SKETCH_5_R)
        with Locations(Location((53, -6, 0), (0, 0, 180))):
            Circle(SKETCH_5_R)
        with Locations(Location((53, -19, 0), (0, 0, 180))):
            Circle(SKETCH_5_R)
    extrude(amount=-CUT_EXTRUDE_3_DEPTH, mode=Mode.SUBTRACT)

    # Эскиз6 → Вырез-Вытянуть4 (cut)
    with BuildSketch(Plane(origin=(0, 32.5, 0), x_dir=(1, 0, 0), z_dir=(0, 1, 0))):
        with Locations(Location((7, -6, 0), (0, 0, 270))):
            Circle(SKETCH_6_R)
        with Locations(Location((7, -19, 0), (0, 0, 270))):
            Circle(SKETCH_6_R)
        with Locations(Location((53, -19, 0), (0, 0, 270))):
            Circle(SKETCH_6_R)
        with Locations(Location((53, -6, 0), (0, 0, 270))):
            Circle(SKETCH_6_R)
    extrude(amount=-CUT_EXTRUDE_4_DEPTH, mode=Mode.SUBTRACT)

    # Эскиз7 → Вырез-Вытянуть5 (cut, through all)
    with BuildSketch(Plane.XY.offset(29)):
        with Locations((30, 22)):
            Circle(SKETCH_7_R)
    extrude(amount=-CUT_EXTRUDE_5_DEPTH, mode=Mode.SUBTRACT)

    # Эскиз8 → Вырез-Вытянуть6 (cut)
    with BuildSketch(Plane.XY.offset(29)):
        with Locations((30, 22)):
            Circle(SKETCH_8_R)
    extrude(amount=-CUT_EXTRUDE_6_DEPTH, mode=Mode.SUBTRACT)


solid = part.part
